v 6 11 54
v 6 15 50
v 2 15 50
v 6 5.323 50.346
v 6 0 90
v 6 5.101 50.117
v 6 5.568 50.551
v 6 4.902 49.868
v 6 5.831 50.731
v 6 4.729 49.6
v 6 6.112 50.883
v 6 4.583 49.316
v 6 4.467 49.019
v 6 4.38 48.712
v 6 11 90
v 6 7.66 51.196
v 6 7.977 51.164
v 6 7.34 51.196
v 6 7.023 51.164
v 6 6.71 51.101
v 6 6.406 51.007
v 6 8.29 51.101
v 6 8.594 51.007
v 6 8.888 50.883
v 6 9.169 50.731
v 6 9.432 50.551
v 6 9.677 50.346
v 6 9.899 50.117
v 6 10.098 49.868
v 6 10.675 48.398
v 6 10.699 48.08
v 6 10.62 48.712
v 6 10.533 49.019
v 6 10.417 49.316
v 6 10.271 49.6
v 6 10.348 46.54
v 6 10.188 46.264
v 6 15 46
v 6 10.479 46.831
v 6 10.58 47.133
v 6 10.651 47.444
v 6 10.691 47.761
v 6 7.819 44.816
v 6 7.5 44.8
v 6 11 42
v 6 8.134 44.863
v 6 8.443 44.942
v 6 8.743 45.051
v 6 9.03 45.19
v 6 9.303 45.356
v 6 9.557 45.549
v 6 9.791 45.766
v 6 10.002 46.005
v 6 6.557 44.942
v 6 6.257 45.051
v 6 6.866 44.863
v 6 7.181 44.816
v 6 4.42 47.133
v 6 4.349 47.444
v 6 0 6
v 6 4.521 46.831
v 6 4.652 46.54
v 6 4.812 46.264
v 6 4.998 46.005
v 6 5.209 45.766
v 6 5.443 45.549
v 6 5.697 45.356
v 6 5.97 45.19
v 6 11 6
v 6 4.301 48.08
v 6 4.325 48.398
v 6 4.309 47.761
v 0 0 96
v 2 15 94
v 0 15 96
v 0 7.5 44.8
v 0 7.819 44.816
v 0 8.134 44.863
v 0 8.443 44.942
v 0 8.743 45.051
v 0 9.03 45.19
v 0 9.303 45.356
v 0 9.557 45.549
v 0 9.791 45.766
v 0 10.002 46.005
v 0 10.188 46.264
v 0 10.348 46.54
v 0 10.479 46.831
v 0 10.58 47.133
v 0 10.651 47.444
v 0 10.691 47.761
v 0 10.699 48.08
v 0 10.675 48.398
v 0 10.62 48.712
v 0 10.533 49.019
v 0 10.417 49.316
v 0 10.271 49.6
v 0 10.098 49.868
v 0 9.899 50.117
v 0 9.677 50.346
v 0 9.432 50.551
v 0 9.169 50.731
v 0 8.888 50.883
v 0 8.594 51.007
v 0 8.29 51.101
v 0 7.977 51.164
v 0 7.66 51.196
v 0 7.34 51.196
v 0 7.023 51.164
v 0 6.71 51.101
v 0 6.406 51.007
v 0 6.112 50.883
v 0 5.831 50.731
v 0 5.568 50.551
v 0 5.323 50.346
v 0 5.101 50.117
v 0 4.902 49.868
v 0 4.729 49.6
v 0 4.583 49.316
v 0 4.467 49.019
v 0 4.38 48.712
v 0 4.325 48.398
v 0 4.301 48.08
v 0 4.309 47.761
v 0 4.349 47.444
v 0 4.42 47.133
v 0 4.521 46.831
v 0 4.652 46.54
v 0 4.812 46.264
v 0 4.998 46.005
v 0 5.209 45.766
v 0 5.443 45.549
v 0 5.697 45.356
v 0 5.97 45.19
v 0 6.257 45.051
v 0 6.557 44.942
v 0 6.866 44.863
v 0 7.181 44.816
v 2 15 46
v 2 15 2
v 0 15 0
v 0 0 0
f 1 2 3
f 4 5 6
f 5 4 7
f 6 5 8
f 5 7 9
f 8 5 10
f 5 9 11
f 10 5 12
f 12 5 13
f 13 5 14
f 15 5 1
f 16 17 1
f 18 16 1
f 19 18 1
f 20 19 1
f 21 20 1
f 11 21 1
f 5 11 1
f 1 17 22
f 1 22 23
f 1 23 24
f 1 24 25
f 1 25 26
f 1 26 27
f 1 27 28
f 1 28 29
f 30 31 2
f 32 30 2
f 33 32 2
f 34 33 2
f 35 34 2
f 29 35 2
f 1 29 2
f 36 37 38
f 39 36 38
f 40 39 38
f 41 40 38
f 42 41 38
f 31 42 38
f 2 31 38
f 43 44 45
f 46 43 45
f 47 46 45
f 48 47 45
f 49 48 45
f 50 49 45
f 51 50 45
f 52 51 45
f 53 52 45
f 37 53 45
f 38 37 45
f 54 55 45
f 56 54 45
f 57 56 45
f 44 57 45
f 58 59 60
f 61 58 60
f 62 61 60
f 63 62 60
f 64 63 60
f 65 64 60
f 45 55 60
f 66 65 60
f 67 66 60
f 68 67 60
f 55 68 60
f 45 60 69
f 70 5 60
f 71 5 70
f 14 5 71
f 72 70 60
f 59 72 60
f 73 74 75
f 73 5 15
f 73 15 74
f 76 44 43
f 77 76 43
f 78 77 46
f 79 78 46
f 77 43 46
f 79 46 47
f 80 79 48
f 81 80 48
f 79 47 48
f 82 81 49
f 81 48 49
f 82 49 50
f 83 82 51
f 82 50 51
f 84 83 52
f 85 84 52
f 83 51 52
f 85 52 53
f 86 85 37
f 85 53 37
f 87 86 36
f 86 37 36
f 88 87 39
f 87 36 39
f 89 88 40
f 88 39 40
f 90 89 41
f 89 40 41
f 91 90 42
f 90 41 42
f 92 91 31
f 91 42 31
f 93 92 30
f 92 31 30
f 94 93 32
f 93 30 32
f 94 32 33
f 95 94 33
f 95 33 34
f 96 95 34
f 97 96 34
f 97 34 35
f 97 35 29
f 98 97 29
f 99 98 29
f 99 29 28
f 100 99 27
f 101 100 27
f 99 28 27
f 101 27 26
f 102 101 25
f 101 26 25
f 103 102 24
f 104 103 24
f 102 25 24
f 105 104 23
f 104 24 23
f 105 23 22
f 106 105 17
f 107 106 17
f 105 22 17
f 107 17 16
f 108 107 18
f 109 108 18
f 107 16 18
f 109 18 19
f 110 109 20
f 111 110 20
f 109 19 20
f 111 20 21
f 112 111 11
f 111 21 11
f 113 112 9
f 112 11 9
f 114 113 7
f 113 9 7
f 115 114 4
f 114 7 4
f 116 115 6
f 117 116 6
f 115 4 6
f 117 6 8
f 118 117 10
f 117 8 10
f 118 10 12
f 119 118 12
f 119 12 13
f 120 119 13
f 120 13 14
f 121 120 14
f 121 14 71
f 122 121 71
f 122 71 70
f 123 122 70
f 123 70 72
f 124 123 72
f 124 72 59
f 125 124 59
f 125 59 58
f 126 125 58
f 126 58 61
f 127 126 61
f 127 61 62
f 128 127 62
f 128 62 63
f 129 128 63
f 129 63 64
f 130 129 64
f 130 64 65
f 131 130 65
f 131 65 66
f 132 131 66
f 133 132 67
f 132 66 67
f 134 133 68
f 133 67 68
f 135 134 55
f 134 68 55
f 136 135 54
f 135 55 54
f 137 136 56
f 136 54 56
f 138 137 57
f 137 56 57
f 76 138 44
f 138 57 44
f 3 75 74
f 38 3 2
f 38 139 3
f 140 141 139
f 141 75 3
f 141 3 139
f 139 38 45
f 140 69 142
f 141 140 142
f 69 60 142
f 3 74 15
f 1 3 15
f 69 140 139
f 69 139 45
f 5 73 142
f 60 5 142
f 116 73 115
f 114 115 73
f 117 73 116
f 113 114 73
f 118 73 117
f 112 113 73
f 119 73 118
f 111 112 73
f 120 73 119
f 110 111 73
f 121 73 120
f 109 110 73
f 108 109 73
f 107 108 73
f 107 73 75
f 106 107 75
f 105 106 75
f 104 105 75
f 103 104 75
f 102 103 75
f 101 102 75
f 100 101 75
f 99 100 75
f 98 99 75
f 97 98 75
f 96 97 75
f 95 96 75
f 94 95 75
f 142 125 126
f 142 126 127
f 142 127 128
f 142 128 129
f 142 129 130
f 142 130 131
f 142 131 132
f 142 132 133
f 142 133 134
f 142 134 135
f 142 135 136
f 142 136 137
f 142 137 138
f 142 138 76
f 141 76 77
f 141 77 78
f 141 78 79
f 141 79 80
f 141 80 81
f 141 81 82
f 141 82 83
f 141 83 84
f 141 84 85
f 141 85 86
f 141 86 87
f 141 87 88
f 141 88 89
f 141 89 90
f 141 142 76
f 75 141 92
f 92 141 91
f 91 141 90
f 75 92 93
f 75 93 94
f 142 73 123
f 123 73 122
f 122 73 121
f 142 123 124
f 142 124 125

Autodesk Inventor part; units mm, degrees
ref_plane "YZ Plane" through (0, 0, 0) normal (1, 0, 0) x (0, 1, 0)
ref_plane "XZ Plane" through (0, 0, 0) normal (0, 1, 0) x (-1, 0, 0)
ref_plane "XY Plane" through (0, 0, 0) normal (0, 0, 1) x (1, 0, 0)
sketch "Sketch1" plane through (0, 0, 0) normal (0, 0, 1) x (1, 0, 0)
  line L0 (0, 0) -> (6, 0)
  line L1 (6, 0) -> (6, 11)
  line L2 (0, 0) -> (0, 15)
  line L3 (0, 15) -> (2, 15)
  line L4 (2, 15) -> (6, 11)
  dimension "d0" = 6
  dimension "d1" = 11
  dimension "d2" = 15
  dimension "d3" = 2
extrude "Extrusion1" add sketch "Sketch1" along normal blind 96
sketch "Sketch2" plane through (0, 0, 0) normal (0, -1, 0) x (1, 0, 0)
  line L0 (0, 0) -> (0, 96) projected
  line L1 (5.9866, 0) -> (0, 0)
  line L2 (0, 96) -> (6, 96) projected
  line L3 (0, 96) -> (6, 96)
  line L4 (6, 96) -> (6, 90)
  line L5 (6, 90) -> (0, 96)
  line L6 (0, 0) -> (6, 0) projected
  line L7 (6, 0) -> (0, 0)
  line L8 (6, 0) -> (6, 6)
  line L9 (6, 0) -> (6, 96) projected
  line L10 (6, 6) -> (0, 0)
  dimension "d7" = 6
  dimension "d8" = 6
extrude "Extrusion2" cut sketch "Sketch2" against normal blind 42.1125 contours L10 L8 L6 L1 | L2 L4 L5
sketch "Sketch3" plane through (6, 0, 90) normal (1, 0, 0) x (0, 0, -1)
  line L0 (84, 11) -> (0, 11) projected
  line L1 (84, 0) -> (0, 0) projected
  line L2 (42, 11) -> (42, 0)
  line L3 (42, 0) -> (48, 0)
  line L4 (90, 0) -> (-6, 0) projected
  line L5 (48, 0) -> (48, 11)
  line L6 (42, 0) -> (36, 0)
  line L7 (36, 0) -> (36, 11)
  line L8 (42, 11) -> (42, 15)
  line L9 (88, 15) -> (-4, 15) projected
  line L10 (42, 15) -> (44, 15)
  line L11 (44, 15) -> (48, 11)
  line L12 (42, 15) -> (40, 15)
  line L13 (40, 15) -> (36, 11)
  point P0 (36, 0)
  dimension "d11" = 6
  dimension "d12" = 6
  dimension "d13" = 2
  dimension "d14" = 2
extrude "Extrusion3" add sketch "Sketch3" against normal blind 6
sketch "Sketch4" plane through (6, 0, 90) normal (1, 0, 0) x (0, 0, -1)
  line L0 (36, 11) -> (0, 11) projected
  line L1 (0, 11) -> (0, 0) projected
  line L2 (84, 0) -> (0, 0) projected
  line L3 (84, 0) -> (84, 11) projected
  line L4 (84, 11) -> (48, 11) projected
  line L5 (48, 11) -> (44, 15) projected
  line L6 (44, 15) -> (40, 15) projected
  line L7 (40, 15) -> (36, 11) projected
  line L8 (84, 0) -> (0, 0) projected
  line L9 (42, 0) -> (42, 7.5)
  circle A0 centre (42, 7.5) radius 3.2
  point P0 (90, 0)
  dimension "d17" = 7.5
  dimension "d18" = 6.4
extrude "Extrusion4" cut sketch "Sketch4" against normal blind 10 contours A0
properties part number "edge-join-hole"
